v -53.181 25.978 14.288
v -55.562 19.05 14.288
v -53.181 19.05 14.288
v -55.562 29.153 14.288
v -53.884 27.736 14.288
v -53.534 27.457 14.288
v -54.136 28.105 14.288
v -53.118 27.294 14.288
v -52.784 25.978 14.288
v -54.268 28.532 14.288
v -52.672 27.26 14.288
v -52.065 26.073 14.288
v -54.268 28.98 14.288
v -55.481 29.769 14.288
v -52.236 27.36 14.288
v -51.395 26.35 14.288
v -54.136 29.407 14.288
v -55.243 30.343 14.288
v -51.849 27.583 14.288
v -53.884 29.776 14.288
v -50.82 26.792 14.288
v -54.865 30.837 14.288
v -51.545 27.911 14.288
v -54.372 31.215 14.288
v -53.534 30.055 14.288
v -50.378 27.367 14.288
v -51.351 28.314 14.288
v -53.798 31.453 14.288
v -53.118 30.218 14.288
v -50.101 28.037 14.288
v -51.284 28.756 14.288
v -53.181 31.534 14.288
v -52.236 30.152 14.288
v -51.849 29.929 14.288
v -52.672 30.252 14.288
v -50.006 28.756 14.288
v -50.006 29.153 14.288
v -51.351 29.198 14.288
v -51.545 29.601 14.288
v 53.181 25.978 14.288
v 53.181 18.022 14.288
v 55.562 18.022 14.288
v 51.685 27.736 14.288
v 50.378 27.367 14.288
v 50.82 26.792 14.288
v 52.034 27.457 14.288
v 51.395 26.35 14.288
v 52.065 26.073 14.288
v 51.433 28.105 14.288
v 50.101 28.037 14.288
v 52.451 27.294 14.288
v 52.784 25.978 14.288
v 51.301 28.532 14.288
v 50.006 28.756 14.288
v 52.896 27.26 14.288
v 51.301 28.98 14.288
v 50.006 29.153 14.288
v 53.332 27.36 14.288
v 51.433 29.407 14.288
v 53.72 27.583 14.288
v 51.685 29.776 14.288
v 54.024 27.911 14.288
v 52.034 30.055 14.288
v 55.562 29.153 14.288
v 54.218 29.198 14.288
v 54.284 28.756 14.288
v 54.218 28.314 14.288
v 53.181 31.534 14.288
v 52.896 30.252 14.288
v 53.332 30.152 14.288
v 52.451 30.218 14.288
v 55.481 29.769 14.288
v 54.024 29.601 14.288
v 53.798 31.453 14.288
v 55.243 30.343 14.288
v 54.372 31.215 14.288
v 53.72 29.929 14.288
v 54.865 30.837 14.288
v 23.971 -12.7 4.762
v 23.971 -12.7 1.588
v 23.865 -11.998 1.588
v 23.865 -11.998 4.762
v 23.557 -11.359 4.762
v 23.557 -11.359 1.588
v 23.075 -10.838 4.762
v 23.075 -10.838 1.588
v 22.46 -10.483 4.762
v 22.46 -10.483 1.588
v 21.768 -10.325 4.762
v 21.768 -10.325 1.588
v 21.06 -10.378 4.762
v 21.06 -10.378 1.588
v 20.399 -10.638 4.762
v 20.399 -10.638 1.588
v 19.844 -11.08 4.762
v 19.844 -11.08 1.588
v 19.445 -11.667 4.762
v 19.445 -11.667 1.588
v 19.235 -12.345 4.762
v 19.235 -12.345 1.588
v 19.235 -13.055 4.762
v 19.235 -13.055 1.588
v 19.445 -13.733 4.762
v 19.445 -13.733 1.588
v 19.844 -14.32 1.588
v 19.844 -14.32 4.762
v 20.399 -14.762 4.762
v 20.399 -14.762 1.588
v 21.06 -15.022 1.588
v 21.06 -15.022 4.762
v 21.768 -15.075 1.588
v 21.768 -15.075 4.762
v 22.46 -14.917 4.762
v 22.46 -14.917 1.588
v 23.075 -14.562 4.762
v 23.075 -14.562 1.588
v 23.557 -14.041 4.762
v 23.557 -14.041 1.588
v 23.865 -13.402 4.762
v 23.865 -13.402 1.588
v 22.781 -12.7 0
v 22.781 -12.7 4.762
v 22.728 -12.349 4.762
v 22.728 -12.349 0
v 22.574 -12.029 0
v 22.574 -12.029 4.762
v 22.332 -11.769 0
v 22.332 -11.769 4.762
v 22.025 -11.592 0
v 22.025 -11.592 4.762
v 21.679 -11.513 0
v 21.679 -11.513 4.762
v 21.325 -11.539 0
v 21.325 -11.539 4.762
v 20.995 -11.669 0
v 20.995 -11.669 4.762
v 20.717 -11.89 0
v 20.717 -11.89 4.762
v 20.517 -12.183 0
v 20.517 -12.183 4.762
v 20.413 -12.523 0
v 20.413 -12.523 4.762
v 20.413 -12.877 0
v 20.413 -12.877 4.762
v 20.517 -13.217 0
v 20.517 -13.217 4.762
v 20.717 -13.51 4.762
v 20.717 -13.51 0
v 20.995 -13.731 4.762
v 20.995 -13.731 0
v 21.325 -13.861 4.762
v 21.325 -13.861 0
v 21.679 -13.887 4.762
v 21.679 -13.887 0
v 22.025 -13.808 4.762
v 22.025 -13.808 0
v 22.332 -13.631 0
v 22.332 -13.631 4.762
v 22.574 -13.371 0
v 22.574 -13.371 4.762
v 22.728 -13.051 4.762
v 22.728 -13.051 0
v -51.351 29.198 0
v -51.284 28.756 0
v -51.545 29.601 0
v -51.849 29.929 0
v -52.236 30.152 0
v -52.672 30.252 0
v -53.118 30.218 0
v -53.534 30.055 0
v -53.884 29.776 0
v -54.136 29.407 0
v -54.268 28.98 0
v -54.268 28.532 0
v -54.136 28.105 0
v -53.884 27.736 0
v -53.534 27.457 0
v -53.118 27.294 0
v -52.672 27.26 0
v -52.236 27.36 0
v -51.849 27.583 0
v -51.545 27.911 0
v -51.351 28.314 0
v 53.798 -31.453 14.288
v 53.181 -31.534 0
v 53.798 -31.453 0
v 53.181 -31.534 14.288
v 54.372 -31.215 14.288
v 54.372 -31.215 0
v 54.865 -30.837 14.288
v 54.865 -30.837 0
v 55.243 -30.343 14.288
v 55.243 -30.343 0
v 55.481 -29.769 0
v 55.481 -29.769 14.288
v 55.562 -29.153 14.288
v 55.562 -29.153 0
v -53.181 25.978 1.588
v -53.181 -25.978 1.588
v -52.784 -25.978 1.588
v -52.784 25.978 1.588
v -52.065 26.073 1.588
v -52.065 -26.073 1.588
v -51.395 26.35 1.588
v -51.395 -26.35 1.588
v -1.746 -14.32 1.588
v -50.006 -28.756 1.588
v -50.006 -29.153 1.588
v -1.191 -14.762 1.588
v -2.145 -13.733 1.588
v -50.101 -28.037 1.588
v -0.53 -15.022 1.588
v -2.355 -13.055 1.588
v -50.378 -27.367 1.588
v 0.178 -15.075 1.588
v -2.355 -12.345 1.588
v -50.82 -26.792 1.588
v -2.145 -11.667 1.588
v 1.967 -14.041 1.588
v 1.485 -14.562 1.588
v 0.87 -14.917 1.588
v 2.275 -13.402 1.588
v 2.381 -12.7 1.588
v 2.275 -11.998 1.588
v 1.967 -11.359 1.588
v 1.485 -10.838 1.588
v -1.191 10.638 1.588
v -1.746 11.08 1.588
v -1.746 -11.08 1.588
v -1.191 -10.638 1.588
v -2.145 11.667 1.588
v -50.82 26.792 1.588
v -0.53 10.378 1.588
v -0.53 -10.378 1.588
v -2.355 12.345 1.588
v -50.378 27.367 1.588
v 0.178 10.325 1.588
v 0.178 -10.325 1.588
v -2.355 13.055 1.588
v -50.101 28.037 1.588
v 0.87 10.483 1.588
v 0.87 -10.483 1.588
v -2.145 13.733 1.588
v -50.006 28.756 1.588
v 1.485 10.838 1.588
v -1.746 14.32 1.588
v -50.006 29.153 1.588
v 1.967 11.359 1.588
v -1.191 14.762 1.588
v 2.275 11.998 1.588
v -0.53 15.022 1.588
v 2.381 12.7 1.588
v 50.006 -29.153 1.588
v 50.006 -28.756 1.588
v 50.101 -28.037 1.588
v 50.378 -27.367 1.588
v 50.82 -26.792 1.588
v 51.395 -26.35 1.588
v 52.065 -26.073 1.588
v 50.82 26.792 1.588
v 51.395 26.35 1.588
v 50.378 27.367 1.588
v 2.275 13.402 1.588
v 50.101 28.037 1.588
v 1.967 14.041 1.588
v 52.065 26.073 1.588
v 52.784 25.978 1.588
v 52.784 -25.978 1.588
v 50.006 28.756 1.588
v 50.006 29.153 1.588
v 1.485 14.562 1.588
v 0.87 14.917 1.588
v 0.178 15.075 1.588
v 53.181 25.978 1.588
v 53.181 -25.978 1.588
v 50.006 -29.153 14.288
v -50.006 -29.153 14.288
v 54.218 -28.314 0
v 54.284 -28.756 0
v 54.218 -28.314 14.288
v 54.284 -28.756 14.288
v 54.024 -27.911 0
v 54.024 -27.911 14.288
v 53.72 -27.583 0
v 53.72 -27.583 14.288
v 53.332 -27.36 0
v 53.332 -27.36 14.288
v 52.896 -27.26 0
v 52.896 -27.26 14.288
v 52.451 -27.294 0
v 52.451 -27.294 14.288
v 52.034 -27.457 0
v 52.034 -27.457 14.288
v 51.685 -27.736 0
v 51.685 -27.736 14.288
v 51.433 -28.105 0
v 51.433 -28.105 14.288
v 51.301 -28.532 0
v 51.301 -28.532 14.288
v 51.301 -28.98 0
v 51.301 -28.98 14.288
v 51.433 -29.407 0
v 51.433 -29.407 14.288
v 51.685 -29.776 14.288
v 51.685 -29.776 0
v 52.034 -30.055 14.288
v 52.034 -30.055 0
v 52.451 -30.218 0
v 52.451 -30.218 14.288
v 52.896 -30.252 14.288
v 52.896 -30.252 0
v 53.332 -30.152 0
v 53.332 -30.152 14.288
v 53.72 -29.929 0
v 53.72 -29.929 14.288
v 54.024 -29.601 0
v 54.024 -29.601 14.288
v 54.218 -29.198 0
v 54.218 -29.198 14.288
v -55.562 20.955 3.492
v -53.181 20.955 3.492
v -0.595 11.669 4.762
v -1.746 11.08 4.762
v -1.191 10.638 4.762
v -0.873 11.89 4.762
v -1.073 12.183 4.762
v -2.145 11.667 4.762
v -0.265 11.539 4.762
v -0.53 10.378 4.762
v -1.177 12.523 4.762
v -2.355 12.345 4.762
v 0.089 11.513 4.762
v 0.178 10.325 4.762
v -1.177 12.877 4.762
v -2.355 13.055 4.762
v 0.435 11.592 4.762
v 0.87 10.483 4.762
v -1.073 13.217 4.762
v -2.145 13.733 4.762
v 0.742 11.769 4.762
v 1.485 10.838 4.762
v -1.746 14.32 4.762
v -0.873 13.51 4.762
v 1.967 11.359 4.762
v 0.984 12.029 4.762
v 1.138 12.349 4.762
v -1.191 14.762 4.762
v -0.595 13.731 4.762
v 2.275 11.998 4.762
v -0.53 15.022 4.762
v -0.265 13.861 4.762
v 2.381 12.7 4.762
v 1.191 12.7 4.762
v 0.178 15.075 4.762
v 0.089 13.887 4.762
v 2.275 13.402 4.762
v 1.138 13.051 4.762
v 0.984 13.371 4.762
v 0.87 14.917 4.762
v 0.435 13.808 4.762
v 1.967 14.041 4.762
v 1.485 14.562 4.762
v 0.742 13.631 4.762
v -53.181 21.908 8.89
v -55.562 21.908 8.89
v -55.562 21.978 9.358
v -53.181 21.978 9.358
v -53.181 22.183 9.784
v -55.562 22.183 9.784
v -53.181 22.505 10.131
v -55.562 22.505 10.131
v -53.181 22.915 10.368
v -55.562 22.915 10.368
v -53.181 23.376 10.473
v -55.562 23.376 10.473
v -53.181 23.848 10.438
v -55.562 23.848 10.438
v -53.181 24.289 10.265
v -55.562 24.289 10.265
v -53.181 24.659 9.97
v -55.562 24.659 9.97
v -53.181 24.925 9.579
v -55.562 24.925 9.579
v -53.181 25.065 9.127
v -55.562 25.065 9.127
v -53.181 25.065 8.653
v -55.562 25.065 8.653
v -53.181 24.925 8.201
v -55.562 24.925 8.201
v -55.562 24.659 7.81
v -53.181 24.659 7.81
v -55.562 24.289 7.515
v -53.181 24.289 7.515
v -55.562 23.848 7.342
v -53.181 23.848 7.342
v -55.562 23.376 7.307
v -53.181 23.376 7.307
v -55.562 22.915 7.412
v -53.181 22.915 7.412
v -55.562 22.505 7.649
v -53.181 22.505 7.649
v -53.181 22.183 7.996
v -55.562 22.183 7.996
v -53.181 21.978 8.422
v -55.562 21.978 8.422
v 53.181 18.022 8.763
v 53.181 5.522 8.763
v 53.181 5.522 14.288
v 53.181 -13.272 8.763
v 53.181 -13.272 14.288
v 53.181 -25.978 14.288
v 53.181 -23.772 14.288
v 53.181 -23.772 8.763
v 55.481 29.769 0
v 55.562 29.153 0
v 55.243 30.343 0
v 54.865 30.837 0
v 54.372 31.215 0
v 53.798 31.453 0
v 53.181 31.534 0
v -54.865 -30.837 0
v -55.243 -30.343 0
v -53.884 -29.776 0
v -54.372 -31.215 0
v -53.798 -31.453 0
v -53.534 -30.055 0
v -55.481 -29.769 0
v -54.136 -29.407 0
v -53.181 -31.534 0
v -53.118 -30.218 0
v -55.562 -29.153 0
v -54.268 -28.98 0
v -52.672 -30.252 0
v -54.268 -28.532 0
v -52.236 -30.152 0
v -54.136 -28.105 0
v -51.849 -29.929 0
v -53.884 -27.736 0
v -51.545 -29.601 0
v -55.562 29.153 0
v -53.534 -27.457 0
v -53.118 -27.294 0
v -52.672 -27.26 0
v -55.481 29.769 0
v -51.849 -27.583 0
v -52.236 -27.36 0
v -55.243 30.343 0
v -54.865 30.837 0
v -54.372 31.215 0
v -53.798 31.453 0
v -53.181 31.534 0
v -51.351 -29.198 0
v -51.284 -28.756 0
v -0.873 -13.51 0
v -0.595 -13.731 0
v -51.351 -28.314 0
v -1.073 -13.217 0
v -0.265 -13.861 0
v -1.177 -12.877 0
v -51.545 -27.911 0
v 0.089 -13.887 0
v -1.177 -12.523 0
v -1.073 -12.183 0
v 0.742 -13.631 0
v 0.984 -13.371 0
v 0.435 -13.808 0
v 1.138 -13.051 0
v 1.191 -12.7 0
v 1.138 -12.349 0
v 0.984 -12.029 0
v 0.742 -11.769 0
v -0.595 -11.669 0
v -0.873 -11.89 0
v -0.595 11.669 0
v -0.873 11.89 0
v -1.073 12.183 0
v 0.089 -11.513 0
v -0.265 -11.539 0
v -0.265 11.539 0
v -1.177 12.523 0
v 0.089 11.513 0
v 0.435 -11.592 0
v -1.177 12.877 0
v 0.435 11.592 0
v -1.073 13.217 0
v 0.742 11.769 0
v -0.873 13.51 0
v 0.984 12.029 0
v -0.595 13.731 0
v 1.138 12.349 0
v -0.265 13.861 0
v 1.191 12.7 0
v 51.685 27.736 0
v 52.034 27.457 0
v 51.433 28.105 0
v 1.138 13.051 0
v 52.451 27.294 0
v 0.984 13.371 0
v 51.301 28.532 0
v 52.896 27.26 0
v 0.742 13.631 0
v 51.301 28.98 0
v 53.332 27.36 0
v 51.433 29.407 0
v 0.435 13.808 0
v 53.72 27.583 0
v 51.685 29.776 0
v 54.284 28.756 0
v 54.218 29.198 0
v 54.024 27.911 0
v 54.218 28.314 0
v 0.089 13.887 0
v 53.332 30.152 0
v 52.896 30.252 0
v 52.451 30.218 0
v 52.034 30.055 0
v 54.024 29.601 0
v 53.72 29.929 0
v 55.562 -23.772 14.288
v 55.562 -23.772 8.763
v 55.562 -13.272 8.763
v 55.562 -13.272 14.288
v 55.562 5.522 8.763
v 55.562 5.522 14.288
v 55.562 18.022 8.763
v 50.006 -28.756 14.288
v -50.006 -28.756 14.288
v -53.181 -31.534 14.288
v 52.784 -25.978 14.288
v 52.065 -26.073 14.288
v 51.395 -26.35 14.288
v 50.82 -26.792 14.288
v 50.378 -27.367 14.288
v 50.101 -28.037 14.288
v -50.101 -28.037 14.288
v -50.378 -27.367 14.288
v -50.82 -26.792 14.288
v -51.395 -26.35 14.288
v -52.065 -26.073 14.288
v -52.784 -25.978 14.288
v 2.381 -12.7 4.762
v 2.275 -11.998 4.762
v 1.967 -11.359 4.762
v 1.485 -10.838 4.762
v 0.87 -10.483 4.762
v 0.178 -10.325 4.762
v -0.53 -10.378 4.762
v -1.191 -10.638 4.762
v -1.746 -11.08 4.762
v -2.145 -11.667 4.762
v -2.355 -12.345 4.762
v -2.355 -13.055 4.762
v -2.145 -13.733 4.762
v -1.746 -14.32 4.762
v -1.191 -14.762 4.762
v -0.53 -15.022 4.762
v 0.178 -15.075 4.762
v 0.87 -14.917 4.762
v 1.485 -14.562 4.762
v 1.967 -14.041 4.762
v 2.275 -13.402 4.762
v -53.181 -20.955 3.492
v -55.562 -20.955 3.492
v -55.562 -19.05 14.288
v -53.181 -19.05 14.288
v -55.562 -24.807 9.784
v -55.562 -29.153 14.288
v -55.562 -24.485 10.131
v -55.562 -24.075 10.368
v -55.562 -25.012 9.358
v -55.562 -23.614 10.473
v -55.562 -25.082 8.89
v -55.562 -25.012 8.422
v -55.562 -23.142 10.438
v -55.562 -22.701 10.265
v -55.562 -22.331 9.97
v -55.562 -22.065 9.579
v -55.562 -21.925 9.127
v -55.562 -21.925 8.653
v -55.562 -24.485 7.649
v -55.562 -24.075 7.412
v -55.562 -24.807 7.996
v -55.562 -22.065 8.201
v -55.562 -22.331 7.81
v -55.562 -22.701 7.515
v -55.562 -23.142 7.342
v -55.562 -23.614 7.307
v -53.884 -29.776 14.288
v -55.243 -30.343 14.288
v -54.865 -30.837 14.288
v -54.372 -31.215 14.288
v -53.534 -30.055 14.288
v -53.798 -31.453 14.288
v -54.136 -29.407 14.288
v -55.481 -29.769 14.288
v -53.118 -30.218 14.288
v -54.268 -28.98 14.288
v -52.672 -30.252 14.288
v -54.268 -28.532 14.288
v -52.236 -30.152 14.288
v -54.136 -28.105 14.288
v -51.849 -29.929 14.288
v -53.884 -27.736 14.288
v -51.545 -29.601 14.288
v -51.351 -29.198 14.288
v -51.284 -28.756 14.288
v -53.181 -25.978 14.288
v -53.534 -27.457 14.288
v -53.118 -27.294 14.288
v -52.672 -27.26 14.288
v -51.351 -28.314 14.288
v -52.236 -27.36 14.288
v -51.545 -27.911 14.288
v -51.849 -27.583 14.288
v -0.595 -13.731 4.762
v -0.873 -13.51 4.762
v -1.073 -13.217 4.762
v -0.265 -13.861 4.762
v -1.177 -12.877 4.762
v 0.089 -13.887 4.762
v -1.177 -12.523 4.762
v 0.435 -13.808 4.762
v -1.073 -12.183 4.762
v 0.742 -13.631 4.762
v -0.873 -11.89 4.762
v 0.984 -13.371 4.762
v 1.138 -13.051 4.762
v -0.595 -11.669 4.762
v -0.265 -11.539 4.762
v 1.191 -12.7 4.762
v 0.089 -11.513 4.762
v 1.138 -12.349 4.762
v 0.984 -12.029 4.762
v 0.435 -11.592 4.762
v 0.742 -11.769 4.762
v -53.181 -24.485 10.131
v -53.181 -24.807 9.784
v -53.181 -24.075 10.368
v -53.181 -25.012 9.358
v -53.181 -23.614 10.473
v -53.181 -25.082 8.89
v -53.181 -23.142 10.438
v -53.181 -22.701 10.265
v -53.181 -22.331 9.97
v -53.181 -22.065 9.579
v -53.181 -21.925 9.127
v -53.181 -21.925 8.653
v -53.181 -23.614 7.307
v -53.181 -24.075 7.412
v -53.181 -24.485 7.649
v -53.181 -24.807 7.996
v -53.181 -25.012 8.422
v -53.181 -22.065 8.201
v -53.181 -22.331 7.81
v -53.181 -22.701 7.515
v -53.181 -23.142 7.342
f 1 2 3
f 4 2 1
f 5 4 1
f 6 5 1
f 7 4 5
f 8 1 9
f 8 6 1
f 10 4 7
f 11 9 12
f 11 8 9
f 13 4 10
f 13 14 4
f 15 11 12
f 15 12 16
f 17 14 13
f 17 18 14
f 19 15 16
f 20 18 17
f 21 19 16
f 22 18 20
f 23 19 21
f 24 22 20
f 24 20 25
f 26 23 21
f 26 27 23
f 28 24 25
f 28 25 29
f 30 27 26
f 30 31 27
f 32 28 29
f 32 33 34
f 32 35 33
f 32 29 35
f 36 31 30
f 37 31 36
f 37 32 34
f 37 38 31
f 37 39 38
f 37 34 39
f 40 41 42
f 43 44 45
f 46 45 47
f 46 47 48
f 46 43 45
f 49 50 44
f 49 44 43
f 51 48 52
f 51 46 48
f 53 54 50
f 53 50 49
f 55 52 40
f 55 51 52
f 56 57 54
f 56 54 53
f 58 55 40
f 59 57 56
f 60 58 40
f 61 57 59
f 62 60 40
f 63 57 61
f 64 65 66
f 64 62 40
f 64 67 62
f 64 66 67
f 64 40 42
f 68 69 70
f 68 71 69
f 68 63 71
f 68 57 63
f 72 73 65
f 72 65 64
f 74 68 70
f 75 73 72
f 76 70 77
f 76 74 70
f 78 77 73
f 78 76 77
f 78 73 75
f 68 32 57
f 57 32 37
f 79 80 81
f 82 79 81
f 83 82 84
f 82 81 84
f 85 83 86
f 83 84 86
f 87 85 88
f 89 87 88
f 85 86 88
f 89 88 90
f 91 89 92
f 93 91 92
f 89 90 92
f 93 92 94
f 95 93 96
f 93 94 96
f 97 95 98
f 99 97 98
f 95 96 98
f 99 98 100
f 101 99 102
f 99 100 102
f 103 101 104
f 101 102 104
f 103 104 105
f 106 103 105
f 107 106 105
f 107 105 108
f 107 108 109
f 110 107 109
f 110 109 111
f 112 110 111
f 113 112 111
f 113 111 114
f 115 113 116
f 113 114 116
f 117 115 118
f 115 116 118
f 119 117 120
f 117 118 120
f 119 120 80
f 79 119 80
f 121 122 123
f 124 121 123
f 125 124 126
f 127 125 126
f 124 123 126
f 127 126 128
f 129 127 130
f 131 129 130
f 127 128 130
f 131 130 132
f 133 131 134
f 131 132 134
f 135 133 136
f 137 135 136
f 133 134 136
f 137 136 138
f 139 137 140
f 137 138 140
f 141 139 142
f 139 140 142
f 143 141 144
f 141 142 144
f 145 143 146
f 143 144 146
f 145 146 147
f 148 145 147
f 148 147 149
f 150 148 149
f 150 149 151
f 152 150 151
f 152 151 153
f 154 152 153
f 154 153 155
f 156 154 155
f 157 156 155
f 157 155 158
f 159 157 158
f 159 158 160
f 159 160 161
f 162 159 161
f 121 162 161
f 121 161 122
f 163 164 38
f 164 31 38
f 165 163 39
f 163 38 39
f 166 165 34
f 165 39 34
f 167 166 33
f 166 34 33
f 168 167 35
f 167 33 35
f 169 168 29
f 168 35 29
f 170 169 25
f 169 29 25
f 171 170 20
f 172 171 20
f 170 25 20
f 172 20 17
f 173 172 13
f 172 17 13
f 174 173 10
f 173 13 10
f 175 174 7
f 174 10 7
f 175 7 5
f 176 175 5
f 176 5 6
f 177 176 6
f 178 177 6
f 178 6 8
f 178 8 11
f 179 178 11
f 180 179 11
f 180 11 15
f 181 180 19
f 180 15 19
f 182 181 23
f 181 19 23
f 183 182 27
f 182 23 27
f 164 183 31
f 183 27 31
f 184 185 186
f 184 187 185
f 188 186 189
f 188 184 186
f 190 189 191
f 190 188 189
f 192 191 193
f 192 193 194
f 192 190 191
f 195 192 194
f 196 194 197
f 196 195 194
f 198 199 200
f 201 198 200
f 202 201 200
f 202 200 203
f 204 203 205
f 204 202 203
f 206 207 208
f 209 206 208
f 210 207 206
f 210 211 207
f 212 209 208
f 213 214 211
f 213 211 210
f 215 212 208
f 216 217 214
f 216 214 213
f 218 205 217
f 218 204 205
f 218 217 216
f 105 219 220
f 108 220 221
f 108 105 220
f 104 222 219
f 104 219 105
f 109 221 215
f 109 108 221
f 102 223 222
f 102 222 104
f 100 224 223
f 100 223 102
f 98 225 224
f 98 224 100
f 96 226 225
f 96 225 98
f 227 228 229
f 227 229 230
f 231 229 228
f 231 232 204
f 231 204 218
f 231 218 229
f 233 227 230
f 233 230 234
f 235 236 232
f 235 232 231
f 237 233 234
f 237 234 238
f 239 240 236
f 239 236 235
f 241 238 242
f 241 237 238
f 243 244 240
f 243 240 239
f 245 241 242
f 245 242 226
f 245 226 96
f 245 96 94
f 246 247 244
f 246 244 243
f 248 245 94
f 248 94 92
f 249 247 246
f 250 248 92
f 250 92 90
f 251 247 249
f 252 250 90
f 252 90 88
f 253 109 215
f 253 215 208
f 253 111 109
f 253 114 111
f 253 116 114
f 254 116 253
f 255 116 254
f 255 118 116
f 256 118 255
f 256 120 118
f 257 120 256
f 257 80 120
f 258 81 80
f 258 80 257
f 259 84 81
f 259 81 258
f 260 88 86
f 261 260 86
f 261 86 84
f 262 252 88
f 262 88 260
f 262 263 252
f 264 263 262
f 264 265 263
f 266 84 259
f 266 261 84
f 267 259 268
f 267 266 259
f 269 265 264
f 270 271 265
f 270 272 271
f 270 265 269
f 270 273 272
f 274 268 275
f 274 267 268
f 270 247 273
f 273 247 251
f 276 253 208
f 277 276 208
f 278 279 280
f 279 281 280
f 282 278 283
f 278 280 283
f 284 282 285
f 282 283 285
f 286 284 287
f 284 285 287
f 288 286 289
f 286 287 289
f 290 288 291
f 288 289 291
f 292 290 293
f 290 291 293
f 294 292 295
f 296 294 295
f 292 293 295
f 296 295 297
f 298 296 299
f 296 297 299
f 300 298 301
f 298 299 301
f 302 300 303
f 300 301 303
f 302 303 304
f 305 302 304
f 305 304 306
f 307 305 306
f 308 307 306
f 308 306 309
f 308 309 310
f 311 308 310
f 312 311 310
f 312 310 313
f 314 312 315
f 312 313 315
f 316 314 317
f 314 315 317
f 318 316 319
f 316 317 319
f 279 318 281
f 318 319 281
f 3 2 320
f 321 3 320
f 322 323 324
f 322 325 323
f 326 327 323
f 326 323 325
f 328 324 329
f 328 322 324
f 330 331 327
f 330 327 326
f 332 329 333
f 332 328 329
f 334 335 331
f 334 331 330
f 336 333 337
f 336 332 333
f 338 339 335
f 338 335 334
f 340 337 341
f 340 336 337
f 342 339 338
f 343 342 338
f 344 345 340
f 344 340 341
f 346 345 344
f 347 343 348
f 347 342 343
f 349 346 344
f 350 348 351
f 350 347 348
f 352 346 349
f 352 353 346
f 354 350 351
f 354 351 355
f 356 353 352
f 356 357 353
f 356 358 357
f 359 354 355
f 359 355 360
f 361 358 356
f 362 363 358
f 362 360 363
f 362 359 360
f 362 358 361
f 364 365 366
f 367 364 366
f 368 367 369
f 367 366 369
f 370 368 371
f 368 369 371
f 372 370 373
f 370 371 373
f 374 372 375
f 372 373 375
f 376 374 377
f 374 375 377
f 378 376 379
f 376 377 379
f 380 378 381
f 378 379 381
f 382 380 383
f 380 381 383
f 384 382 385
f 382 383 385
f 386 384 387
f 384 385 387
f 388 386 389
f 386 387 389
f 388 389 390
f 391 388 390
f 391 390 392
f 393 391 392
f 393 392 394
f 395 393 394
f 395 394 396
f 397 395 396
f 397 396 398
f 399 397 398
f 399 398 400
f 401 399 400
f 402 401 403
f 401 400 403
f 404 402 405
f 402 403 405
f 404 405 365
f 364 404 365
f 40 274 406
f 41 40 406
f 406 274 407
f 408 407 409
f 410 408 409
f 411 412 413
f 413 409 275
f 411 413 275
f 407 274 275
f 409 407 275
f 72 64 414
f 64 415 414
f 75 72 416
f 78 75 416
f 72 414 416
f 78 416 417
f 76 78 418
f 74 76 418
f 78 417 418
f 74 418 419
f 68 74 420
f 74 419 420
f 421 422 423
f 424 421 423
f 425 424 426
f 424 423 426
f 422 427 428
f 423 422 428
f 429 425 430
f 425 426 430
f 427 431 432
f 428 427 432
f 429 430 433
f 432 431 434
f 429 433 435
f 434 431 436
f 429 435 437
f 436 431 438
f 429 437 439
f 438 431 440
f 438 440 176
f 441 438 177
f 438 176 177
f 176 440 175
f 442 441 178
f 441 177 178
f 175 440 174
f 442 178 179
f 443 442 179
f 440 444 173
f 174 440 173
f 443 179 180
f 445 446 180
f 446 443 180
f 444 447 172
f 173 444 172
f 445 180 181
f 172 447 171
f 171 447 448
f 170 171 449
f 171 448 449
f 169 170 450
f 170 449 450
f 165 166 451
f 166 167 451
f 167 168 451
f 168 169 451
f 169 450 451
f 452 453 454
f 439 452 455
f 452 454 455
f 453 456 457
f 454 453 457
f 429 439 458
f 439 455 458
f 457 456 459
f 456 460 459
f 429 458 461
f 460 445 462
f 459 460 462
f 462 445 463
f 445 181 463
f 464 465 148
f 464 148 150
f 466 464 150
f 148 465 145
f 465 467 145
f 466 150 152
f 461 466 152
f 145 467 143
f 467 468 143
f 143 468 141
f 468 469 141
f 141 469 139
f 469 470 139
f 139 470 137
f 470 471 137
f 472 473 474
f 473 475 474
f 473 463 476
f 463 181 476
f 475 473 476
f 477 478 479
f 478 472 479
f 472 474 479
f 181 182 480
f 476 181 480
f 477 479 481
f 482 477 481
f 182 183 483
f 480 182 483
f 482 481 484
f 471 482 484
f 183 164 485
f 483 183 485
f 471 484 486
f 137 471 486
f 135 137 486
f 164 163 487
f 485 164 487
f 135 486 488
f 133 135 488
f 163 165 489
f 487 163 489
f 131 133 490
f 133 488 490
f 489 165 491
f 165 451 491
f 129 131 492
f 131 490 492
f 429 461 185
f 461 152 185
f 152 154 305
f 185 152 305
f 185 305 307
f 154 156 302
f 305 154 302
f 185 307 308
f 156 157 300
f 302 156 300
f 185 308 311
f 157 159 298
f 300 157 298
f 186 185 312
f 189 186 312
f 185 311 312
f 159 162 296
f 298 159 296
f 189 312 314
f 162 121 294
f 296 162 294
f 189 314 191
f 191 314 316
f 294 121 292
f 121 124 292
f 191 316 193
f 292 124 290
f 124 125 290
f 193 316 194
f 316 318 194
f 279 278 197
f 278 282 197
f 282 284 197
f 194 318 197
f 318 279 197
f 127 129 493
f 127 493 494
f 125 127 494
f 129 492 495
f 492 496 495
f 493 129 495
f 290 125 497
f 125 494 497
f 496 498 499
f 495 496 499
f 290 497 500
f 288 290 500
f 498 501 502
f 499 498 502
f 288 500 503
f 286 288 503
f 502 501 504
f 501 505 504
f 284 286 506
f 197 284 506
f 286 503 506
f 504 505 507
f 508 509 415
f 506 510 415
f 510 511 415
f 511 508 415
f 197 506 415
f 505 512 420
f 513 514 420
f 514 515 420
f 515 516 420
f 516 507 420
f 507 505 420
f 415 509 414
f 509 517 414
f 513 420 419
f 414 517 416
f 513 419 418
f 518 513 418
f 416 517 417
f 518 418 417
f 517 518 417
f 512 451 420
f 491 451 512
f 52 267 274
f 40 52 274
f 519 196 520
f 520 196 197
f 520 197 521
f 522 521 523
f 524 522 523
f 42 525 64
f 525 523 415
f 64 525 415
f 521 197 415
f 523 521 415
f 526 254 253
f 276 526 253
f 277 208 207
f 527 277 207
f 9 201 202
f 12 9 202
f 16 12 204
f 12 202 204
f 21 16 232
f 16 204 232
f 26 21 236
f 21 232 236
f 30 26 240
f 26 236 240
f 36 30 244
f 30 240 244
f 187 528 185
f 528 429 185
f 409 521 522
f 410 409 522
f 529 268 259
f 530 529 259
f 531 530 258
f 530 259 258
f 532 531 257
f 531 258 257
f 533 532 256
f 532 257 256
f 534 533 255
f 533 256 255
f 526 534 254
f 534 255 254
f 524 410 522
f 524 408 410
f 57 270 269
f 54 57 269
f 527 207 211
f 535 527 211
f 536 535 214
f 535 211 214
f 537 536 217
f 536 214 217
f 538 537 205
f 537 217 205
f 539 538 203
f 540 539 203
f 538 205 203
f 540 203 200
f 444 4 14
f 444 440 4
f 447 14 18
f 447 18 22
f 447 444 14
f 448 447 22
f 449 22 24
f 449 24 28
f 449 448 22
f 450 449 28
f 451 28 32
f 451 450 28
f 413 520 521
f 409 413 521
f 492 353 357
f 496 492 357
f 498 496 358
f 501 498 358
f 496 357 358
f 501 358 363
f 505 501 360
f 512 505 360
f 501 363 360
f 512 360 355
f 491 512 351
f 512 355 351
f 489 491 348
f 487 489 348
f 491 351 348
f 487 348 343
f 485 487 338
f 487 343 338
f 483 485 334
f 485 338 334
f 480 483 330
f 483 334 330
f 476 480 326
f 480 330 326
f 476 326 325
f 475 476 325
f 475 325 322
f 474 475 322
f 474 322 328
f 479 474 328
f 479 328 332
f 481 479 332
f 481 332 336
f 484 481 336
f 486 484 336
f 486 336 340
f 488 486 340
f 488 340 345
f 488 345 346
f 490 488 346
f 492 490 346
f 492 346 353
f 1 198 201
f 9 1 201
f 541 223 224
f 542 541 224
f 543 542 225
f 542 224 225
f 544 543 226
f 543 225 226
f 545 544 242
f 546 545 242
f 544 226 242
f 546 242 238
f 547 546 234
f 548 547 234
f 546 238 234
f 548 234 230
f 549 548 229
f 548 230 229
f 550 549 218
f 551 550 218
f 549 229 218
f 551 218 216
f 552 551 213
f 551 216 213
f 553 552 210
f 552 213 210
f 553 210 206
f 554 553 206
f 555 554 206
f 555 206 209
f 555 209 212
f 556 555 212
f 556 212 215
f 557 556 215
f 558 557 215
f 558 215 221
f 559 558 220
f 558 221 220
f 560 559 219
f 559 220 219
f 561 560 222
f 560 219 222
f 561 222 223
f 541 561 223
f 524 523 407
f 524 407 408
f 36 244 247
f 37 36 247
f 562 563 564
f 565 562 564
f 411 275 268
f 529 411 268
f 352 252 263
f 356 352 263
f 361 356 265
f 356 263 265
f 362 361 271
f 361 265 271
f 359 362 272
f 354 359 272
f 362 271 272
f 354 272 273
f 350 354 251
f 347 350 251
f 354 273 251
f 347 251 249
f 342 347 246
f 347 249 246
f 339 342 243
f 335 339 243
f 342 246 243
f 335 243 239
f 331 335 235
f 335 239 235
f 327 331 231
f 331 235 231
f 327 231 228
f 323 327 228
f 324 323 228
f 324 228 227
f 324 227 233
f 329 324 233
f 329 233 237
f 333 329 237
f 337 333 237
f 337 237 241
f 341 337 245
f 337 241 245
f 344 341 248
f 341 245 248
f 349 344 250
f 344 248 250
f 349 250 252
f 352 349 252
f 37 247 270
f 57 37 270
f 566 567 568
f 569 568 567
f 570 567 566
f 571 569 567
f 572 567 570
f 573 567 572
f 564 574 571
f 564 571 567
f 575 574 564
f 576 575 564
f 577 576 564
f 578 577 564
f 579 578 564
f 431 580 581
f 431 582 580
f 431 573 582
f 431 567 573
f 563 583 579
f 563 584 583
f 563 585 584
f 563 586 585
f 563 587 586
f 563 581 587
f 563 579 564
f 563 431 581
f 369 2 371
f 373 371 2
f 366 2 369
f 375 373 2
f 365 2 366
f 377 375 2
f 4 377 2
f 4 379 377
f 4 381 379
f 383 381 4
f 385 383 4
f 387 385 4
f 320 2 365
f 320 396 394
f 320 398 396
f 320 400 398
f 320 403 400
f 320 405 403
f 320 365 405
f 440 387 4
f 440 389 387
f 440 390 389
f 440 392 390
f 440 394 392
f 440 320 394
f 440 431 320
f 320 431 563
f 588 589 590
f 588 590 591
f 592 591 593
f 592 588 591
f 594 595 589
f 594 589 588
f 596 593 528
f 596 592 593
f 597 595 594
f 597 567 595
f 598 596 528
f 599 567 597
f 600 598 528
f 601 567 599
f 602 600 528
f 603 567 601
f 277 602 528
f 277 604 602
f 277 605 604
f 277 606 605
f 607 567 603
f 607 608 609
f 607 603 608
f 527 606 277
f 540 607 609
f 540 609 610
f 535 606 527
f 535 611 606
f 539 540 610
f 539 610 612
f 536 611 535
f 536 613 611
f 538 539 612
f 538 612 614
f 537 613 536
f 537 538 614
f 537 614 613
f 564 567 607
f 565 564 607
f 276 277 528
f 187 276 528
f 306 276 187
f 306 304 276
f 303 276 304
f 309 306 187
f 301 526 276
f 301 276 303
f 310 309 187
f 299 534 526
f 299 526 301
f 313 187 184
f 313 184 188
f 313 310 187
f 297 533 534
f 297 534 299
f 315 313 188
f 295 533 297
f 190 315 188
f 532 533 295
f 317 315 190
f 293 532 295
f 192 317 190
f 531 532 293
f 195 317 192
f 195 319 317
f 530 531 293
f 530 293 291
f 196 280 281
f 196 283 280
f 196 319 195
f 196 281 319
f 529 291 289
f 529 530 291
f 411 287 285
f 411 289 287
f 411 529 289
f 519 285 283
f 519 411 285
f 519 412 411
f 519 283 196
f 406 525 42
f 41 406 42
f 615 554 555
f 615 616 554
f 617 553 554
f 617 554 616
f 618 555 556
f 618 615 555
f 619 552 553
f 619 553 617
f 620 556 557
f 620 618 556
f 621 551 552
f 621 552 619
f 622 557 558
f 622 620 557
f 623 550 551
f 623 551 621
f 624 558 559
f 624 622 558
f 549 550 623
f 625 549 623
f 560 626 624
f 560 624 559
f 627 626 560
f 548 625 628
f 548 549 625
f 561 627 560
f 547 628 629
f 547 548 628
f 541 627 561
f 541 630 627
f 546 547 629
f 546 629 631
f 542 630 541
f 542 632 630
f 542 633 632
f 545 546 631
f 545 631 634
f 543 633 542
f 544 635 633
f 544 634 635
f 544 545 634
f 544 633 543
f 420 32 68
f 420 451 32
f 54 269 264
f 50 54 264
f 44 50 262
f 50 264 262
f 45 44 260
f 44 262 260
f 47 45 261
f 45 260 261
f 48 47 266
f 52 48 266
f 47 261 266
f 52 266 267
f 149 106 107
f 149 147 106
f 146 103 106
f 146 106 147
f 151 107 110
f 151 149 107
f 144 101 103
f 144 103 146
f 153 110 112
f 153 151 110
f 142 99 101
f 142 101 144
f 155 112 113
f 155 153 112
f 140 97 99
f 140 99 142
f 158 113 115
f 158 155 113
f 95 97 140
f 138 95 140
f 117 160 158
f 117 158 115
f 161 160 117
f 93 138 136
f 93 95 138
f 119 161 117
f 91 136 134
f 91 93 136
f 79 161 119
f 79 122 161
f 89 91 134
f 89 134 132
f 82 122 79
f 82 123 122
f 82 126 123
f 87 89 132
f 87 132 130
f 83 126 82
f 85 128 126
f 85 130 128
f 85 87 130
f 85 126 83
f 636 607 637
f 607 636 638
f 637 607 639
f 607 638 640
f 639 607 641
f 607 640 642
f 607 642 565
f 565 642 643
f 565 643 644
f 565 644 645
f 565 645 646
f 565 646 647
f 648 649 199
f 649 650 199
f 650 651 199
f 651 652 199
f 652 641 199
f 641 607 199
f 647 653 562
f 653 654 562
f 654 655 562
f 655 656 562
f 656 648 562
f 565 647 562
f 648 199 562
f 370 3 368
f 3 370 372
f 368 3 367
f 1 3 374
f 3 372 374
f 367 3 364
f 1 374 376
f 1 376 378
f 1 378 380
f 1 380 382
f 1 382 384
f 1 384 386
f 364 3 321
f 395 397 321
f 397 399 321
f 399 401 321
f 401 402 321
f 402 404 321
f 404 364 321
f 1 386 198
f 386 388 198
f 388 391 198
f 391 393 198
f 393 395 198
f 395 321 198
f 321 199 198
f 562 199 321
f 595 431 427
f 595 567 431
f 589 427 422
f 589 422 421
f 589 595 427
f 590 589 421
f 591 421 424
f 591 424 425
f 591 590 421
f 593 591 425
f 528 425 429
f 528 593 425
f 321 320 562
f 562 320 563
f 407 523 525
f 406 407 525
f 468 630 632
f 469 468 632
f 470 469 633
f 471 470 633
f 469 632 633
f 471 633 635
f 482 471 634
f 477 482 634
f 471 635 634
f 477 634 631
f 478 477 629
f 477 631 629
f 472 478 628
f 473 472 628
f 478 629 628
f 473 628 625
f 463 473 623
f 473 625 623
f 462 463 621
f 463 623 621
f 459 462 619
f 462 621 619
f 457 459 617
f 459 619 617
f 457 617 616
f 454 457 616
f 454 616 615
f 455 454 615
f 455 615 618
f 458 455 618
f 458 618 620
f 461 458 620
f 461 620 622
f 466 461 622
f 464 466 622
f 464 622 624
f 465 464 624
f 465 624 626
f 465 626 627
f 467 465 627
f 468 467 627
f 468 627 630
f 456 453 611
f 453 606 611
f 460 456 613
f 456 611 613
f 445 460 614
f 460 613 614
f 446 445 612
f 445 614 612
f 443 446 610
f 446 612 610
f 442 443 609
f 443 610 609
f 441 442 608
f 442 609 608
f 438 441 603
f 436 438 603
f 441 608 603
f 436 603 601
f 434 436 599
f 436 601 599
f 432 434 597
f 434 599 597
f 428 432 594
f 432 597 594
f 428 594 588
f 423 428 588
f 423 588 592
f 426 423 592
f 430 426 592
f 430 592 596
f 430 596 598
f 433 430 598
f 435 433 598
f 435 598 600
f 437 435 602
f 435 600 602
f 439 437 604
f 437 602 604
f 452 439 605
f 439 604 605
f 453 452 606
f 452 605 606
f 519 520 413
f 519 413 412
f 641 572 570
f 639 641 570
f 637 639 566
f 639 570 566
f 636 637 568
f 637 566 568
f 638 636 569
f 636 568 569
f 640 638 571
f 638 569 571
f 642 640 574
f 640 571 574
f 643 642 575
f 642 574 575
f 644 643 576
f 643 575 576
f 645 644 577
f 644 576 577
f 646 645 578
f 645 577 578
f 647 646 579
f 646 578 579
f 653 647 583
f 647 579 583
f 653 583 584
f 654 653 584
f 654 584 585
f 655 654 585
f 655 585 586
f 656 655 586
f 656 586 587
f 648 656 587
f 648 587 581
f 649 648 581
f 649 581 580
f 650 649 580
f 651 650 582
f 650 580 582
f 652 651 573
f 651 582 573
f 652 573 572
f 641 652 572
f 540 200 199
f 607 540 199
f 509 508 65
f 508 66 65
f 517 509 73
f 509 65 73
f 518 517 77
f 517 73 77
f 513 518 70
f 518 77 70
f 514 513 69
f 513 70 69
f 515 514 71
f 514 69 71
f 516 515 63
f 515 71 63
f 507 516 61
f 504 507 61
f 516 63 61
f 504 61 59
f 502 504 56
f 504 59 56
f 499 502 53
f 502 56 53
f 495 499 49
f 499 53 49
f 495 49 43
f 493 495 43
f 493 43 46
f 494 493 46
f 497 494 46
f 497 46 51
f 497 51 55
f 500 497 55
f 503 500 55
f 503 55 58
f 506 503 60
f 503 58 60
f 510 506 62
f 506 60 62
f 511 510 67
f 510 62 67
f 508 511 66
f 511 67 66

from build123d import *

# Parameters (mm, degrees)
F1_W      = 111.125
F1_H      = 63.0682
F2_DEPTH  = 1.5875
F3_W      = 111.125
F3_H      = 63.0682
F3_R      = 1.5
F4_DEPTH  = 12.7
F5_R      = 2.38125
F6_W      = 10.5
F6_H      = 5.5245
F6_W_2    = 12.5
F7_DEPTH  = 2.38125
F9_R      = 1.5875
F10_DEPTH = 2.38125
F11_R     = 2.38125
F12_DEPTH = 3.175
F13_R     = 1.190625
F14_DEPTH = 4.7635
F15_R     = 1.5
F16_DEPTH = 14.2885


with BuildPart() as f2:
    # F1 (on Top) → F2 (new body)
    with BuildSketch(Plane.XY):
        Rectangle(F1_W, F1_H)
    extrude(amount=F2_DEPTH)

    # F3 (on face) → F4 (join)
    with BuildSketch(Plane.XY.offset(1.5875)):
        Rectangle(F3_W, F3_H)
        with Locations((-52.784375, -28.755975)):
            Circle(F3_R, mode=Mode.SUBTRACT)
        with Locations((52.784375, -28.755975)):
            Circle(F3_R, mode=Mode.SUBTRACT)
        with BuildLine():
            Line((52.784375, 25.97785), (53.18125, 25.97785))
            Line((53.18125, 25.97785), (53.18125, -25.97785))
            Line((53.18125, -25.97785), (52.784375, -25.97785))
            ThreePointArc((52.784375, -25.97785), (50.819944, -26.791544), (50.00625, -28.755975))
            Line((50.00625, -28.755975), (50.00625, -29.15285))
            Line((50.00625, -29.15285), (-50.00625, -29.15285))
            Line((-50.00625, -29.15285), (-50.00625, -28.755975))
            ThreePointArc((-50.00625, -28.755975), (-50.819944, -26.791544), (-52.784375, -25.97785))
            Line((-52.784375, -25.97785), (-53.18125, -25.97785))
            Line((-53.18125, -25.97785), (-53.18125, 25.97785))
            Line((-53.18125, 25.97785), (-52.784375, 25.97785))
            ThreePointArc((-52.784375, 25.97785), (-50.819944, 26.791544), (-50.00625, 28.755975))
            Line((-50.00625, 28.755975), (-50.00625, 29.15285))
            Line((-50.00625, 29.15285), (50.00625, 29.15285))
            Line((50.00625, 29.15285), (50.00625, 28.755975))
            ThreePointArc((50.00625, 28.755975), (50.819944, 26.791544), (52.784375, 25.97785))
        make_face(mode=Mode.SUBTRACT)
        with Locations((-52.784375, 28.755975)):
            Circle(F3_R, mode=Mode.SUBTRACT)
        with Locations((52.784375, 28.755975)):
            Circle(F3_R, mode=Mode.SUBTRACT)
    extrude(amount=F4_DEPTH)

    # F5
    f5_edges = [f2.edges().sort_by_distance(p)[0] for p in [
        (55.5625, -31.5341, 7.14375),
        (55.5625, 31.5341, 7.14375),
        (-55.5625, -31.5341, 7.14375),
        (-55.5625, 31.5341, 7.14375),
    ]]
    fillet(f5_edges, radius=F5_R)

    # F6 (on face) → F7 (cut, through all)
    with BuildSketch(Plane.YZ.offset(55.5625)):
        with Locations((-18.5216, 11.52525)):
            Rectangle(F6_W, F6_H)
        with Locations((11.7716, 11.52525)):
            Rectangle(F6_W_2, F6_H)
    extrude(amount=-F7_DEPTH, mode=Mode.SUBTRACT)

    # F9 (on face) → F10 (cut, through all)
    with BuildSketch(Plane(origin=(-55.5625, 0, 0), x_dir=(0, -1, 0), z_dir=(-1, 0, 0))):
        Polygon((19.05, 14.2875), (-19.05, 14.2875), (-20.955, 3.4925), (20.955, 3.4925), align=None)
        with Locations((-23.495, 8.89)):
            Circle(F9_R)
        with Locations((23.495, 8.89)):
            Circle(F9_R)
    extrude(amount=-F10_DEPTH, mode=Mode.SUBTRACT)

    # F11 (on face) → F12 (join)
    with BuildSketch(Plane.XY.offset(1.5875)):
        with Locations((0, 12.7)):
            Circle(F11_R)
        with Locations((0, -12.7)):
            Circle(F11_R)
        with Locations((21.59, -12.7)):
            Circle(F11_R)
    extrude(amount=F12_DEPTH)

    # F13 (on face) → F14 (cut, through all)
    with BuildSketch(Plane.XY.offset(4.7625)):
        with Locations((0, 12.7)):
            Circle(F13_R)
        with Locations((0, -12.7)):
            Circle(F13_R)
        with Locations((21.59, -12.7)):
            Circle(F13_R)
    extrude(amount=-F14_DEPTH, mode=Mode.SUBTRACT)

    # F15 (on face) → F16 (cut, through all)
    with BuildSketch(Plane.XY.offset(14.2875)):
        with Locations((52.784375, 28.755975)):
            Circle(F15_R)
        with Locations((52.784375, -28.755975)):
            Circle(F15_R)
        with Locations((-52.784375, -28.755975)):
            Circle(F15_R)
        with Locations((-52.784375, 28.755975)):
            Circle(F15_R)
    extrude(amount=-F16_DEPTH, mode=Mode.SUBTRACT)


solid = f2.part
